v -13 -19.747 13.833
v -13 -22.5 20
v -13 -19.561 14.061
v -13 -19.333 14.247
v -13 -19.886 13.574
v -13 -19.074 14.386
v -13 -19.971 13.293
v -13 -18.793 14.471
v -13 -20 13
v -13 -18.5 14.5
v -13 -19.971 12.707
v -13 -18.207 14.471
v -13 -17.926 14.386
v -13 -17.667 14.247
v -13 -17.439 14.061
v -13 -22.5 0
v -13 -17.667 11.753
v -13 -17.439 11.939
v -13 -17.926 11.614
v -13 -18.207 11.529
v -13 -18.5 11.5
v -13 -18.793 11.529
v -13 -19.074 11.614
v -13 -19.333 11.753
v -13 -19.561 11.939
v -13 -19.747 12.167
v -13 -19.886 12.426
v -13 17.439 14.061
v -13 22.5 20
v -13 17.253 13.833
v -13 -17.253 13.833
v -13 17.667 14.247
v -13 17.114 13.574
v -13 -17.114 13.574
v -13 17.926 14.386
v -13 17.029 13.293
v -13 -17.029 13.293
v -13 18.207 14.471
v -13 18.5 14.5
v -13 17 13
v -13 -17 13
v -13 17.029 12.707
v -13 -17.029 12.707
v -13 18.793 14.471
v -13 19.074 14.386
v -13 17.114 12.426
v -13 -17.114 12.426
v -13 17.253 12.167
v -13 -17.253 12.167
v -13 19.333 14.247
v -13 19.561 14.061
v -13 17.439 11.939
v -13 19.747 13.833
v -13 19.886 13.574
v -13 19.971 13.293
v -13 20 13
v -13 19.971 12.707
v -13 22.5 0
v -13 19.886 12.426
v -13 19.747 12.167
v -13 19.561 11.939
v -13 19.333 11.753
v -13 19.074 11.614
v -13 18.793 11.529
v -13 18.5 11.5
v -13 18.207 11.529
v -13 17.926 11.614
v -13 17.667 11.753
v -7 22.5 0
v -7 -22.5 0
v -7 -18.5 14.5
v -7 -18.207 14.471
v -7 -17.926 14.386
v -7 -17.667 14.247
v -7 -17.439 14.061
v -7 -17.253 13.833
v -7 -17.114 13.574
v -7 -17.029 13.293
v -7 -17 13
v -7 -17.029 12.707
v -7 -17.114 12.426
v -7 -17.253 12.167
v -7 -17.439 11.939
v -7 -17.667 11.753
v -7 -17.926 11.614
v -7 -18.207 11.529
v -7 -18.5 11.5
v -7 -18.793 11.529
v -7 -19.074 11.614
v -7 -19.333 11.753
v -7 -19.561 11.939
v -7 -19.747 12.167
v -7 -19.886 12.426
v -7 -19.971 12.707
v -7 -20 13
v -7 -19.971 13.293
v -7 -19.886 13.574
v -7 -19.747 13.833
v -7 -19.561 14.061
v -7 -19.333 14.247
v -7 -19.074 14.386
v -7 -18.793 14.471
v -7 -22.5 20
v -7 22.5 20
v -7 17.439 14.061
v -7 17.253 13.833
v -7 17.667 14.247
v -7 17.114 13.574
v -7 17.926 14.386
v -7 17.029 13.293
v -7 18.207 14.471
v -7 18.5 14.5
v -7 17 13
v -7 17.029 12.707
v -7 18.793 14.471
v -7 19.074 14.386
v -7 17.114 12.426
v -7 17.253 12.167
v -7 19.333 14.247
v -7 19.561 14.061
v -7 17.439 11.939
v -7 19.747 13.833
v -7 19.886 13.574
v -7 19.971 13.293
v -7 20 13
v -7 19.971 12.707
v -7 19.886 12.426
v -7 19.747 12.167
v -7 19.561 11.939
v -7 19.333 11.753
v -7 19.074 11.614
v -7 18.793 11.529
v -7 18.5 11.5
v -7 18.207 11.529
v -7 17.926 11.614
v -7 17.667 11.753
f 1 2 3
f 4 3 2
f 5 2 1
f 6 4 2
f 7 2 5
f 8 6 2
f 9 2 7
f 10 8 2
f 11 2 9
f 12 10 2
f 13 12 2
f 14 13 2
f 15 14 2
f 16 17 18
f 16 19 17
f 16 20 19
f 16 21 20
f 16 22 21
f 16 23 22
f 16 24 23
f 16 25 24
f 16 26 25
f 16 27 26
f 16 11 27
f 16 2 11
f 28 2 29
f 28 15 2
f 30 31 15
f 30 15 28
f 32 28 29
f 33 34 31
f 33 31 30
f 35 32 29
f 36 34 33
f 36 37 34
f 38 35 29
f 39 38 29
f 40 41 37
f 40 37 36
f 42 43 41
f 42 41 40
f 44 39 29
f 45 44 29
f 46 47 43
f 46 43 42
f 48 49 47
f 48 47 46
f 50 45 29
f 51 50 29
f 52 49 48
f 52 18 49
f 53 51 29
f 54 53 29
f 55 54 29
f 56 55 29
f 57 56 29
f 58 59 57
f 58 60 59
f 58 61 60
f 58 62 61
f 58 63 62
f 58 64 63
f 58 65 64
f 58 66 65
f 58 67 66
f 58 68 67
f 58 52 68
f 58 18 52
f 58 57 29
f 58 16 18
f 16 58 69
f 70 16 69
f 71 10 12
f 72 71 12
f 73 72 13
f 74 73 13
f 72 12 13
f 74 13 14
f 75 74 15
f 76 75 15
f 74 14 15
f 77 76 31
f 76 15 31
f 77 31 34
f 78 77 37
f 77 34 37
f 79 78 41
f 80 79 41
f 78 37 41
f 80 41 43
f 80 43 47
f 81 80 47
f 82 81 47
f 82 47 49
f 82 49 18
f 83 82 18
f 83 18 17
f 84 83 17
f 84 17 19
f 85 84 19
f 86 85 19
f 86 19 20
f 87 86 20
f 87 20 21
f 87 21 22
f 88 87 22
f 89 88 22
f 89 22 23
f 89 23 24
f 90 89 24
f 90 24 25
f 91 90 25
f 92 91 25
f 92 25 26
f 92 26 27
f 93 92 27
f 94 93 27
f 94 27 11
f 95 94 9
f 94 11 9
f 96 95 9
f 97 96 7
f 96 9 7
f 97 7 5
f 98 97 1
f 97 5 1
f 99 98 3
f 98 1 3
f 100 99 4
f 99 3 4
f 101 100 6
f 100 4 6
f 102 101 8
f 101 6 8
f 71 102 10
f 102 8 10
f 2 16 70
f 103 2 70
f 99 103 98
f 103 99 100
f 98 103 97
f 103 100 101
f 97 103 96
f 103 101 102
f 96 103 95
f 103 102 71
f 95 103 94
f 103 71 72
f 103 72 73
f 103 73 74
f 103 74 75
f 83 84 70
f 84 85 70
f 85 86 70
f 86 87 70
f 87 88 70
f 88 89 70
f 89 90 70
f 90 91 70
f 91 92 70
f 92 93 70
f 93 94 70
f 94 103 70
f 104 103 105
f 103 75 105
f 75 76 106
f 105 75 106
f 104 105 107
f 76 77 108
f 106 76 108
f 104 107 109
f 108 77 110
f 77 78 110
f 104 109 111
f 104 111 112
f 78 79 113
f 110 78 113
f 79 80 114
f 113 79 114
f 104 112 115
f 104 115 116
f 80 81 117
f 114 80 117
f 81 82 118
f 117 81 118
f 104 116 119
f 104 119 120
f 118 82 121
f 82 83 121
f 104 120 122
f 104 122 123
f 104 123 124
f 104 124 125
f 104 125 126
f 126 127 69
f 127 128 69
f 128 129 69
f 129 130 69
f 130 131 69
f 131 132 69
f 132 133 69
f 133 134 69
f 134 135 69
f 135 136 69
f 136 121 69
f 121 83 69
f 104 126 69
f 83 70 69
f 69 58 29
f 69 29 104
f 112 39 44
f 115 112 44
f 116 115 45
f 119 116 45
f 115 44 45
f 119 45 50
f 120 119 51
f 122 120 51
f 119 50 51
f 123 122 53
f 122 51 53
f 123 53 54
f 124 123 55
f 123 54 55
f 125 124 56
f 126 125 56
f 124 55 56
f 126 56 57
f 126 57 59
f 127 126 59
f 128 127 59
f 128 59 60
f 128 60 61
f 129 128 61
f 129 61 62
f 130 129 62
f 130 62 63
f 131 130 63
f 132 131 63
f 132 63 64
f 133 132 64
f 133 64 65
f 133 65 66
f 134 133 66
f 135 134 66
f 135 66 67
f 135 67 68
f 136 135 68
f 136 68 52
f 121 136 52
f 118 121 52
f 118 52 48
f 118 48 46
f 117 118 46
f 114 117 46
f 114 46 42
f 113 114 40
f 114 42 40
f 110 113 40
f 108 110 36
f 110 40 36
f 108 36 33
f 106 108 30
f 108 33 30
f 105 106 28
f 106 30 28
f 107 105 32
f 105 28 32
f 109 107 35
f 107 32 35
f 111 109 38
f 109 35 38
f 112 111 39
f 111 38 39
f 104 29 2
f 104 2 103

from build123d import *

# Parameters (mm, degrees)
SKETCH1_W           = 6
SKETCH1_H           = 45
BOSS_EXTRUDE1_DEPTH = 20
SKETCH2_R           = 1.5
CUT_EXTRUDE2_DEPTH  = 7


with BuildPart() as part:
    # Sketch1 → Boss-Extrude1 (new body)
    with BuildSketch(Plane.XY):
        with Locations((-10, 0)):
            Rectangle(SKETCH1_W, SKETCH1_H)
    extrude(amount=BOSS_EXTRUDE1_DEPTH)

    # Sketch2 → Cut-Extrude2 (cut, through all)
    with BuildSketch(Plane.ZY.offset(13)):
        with Locations((13, -18.5)):
            Circle(SKETCH2_R)
        with Locations((13, 18.5)):
            Circle(SKETCH2_R)
    extrude(amount=-CUT_EXTRUDE2_DEPTH, mode=Mode.SUBTRACT)


solid = part.part
